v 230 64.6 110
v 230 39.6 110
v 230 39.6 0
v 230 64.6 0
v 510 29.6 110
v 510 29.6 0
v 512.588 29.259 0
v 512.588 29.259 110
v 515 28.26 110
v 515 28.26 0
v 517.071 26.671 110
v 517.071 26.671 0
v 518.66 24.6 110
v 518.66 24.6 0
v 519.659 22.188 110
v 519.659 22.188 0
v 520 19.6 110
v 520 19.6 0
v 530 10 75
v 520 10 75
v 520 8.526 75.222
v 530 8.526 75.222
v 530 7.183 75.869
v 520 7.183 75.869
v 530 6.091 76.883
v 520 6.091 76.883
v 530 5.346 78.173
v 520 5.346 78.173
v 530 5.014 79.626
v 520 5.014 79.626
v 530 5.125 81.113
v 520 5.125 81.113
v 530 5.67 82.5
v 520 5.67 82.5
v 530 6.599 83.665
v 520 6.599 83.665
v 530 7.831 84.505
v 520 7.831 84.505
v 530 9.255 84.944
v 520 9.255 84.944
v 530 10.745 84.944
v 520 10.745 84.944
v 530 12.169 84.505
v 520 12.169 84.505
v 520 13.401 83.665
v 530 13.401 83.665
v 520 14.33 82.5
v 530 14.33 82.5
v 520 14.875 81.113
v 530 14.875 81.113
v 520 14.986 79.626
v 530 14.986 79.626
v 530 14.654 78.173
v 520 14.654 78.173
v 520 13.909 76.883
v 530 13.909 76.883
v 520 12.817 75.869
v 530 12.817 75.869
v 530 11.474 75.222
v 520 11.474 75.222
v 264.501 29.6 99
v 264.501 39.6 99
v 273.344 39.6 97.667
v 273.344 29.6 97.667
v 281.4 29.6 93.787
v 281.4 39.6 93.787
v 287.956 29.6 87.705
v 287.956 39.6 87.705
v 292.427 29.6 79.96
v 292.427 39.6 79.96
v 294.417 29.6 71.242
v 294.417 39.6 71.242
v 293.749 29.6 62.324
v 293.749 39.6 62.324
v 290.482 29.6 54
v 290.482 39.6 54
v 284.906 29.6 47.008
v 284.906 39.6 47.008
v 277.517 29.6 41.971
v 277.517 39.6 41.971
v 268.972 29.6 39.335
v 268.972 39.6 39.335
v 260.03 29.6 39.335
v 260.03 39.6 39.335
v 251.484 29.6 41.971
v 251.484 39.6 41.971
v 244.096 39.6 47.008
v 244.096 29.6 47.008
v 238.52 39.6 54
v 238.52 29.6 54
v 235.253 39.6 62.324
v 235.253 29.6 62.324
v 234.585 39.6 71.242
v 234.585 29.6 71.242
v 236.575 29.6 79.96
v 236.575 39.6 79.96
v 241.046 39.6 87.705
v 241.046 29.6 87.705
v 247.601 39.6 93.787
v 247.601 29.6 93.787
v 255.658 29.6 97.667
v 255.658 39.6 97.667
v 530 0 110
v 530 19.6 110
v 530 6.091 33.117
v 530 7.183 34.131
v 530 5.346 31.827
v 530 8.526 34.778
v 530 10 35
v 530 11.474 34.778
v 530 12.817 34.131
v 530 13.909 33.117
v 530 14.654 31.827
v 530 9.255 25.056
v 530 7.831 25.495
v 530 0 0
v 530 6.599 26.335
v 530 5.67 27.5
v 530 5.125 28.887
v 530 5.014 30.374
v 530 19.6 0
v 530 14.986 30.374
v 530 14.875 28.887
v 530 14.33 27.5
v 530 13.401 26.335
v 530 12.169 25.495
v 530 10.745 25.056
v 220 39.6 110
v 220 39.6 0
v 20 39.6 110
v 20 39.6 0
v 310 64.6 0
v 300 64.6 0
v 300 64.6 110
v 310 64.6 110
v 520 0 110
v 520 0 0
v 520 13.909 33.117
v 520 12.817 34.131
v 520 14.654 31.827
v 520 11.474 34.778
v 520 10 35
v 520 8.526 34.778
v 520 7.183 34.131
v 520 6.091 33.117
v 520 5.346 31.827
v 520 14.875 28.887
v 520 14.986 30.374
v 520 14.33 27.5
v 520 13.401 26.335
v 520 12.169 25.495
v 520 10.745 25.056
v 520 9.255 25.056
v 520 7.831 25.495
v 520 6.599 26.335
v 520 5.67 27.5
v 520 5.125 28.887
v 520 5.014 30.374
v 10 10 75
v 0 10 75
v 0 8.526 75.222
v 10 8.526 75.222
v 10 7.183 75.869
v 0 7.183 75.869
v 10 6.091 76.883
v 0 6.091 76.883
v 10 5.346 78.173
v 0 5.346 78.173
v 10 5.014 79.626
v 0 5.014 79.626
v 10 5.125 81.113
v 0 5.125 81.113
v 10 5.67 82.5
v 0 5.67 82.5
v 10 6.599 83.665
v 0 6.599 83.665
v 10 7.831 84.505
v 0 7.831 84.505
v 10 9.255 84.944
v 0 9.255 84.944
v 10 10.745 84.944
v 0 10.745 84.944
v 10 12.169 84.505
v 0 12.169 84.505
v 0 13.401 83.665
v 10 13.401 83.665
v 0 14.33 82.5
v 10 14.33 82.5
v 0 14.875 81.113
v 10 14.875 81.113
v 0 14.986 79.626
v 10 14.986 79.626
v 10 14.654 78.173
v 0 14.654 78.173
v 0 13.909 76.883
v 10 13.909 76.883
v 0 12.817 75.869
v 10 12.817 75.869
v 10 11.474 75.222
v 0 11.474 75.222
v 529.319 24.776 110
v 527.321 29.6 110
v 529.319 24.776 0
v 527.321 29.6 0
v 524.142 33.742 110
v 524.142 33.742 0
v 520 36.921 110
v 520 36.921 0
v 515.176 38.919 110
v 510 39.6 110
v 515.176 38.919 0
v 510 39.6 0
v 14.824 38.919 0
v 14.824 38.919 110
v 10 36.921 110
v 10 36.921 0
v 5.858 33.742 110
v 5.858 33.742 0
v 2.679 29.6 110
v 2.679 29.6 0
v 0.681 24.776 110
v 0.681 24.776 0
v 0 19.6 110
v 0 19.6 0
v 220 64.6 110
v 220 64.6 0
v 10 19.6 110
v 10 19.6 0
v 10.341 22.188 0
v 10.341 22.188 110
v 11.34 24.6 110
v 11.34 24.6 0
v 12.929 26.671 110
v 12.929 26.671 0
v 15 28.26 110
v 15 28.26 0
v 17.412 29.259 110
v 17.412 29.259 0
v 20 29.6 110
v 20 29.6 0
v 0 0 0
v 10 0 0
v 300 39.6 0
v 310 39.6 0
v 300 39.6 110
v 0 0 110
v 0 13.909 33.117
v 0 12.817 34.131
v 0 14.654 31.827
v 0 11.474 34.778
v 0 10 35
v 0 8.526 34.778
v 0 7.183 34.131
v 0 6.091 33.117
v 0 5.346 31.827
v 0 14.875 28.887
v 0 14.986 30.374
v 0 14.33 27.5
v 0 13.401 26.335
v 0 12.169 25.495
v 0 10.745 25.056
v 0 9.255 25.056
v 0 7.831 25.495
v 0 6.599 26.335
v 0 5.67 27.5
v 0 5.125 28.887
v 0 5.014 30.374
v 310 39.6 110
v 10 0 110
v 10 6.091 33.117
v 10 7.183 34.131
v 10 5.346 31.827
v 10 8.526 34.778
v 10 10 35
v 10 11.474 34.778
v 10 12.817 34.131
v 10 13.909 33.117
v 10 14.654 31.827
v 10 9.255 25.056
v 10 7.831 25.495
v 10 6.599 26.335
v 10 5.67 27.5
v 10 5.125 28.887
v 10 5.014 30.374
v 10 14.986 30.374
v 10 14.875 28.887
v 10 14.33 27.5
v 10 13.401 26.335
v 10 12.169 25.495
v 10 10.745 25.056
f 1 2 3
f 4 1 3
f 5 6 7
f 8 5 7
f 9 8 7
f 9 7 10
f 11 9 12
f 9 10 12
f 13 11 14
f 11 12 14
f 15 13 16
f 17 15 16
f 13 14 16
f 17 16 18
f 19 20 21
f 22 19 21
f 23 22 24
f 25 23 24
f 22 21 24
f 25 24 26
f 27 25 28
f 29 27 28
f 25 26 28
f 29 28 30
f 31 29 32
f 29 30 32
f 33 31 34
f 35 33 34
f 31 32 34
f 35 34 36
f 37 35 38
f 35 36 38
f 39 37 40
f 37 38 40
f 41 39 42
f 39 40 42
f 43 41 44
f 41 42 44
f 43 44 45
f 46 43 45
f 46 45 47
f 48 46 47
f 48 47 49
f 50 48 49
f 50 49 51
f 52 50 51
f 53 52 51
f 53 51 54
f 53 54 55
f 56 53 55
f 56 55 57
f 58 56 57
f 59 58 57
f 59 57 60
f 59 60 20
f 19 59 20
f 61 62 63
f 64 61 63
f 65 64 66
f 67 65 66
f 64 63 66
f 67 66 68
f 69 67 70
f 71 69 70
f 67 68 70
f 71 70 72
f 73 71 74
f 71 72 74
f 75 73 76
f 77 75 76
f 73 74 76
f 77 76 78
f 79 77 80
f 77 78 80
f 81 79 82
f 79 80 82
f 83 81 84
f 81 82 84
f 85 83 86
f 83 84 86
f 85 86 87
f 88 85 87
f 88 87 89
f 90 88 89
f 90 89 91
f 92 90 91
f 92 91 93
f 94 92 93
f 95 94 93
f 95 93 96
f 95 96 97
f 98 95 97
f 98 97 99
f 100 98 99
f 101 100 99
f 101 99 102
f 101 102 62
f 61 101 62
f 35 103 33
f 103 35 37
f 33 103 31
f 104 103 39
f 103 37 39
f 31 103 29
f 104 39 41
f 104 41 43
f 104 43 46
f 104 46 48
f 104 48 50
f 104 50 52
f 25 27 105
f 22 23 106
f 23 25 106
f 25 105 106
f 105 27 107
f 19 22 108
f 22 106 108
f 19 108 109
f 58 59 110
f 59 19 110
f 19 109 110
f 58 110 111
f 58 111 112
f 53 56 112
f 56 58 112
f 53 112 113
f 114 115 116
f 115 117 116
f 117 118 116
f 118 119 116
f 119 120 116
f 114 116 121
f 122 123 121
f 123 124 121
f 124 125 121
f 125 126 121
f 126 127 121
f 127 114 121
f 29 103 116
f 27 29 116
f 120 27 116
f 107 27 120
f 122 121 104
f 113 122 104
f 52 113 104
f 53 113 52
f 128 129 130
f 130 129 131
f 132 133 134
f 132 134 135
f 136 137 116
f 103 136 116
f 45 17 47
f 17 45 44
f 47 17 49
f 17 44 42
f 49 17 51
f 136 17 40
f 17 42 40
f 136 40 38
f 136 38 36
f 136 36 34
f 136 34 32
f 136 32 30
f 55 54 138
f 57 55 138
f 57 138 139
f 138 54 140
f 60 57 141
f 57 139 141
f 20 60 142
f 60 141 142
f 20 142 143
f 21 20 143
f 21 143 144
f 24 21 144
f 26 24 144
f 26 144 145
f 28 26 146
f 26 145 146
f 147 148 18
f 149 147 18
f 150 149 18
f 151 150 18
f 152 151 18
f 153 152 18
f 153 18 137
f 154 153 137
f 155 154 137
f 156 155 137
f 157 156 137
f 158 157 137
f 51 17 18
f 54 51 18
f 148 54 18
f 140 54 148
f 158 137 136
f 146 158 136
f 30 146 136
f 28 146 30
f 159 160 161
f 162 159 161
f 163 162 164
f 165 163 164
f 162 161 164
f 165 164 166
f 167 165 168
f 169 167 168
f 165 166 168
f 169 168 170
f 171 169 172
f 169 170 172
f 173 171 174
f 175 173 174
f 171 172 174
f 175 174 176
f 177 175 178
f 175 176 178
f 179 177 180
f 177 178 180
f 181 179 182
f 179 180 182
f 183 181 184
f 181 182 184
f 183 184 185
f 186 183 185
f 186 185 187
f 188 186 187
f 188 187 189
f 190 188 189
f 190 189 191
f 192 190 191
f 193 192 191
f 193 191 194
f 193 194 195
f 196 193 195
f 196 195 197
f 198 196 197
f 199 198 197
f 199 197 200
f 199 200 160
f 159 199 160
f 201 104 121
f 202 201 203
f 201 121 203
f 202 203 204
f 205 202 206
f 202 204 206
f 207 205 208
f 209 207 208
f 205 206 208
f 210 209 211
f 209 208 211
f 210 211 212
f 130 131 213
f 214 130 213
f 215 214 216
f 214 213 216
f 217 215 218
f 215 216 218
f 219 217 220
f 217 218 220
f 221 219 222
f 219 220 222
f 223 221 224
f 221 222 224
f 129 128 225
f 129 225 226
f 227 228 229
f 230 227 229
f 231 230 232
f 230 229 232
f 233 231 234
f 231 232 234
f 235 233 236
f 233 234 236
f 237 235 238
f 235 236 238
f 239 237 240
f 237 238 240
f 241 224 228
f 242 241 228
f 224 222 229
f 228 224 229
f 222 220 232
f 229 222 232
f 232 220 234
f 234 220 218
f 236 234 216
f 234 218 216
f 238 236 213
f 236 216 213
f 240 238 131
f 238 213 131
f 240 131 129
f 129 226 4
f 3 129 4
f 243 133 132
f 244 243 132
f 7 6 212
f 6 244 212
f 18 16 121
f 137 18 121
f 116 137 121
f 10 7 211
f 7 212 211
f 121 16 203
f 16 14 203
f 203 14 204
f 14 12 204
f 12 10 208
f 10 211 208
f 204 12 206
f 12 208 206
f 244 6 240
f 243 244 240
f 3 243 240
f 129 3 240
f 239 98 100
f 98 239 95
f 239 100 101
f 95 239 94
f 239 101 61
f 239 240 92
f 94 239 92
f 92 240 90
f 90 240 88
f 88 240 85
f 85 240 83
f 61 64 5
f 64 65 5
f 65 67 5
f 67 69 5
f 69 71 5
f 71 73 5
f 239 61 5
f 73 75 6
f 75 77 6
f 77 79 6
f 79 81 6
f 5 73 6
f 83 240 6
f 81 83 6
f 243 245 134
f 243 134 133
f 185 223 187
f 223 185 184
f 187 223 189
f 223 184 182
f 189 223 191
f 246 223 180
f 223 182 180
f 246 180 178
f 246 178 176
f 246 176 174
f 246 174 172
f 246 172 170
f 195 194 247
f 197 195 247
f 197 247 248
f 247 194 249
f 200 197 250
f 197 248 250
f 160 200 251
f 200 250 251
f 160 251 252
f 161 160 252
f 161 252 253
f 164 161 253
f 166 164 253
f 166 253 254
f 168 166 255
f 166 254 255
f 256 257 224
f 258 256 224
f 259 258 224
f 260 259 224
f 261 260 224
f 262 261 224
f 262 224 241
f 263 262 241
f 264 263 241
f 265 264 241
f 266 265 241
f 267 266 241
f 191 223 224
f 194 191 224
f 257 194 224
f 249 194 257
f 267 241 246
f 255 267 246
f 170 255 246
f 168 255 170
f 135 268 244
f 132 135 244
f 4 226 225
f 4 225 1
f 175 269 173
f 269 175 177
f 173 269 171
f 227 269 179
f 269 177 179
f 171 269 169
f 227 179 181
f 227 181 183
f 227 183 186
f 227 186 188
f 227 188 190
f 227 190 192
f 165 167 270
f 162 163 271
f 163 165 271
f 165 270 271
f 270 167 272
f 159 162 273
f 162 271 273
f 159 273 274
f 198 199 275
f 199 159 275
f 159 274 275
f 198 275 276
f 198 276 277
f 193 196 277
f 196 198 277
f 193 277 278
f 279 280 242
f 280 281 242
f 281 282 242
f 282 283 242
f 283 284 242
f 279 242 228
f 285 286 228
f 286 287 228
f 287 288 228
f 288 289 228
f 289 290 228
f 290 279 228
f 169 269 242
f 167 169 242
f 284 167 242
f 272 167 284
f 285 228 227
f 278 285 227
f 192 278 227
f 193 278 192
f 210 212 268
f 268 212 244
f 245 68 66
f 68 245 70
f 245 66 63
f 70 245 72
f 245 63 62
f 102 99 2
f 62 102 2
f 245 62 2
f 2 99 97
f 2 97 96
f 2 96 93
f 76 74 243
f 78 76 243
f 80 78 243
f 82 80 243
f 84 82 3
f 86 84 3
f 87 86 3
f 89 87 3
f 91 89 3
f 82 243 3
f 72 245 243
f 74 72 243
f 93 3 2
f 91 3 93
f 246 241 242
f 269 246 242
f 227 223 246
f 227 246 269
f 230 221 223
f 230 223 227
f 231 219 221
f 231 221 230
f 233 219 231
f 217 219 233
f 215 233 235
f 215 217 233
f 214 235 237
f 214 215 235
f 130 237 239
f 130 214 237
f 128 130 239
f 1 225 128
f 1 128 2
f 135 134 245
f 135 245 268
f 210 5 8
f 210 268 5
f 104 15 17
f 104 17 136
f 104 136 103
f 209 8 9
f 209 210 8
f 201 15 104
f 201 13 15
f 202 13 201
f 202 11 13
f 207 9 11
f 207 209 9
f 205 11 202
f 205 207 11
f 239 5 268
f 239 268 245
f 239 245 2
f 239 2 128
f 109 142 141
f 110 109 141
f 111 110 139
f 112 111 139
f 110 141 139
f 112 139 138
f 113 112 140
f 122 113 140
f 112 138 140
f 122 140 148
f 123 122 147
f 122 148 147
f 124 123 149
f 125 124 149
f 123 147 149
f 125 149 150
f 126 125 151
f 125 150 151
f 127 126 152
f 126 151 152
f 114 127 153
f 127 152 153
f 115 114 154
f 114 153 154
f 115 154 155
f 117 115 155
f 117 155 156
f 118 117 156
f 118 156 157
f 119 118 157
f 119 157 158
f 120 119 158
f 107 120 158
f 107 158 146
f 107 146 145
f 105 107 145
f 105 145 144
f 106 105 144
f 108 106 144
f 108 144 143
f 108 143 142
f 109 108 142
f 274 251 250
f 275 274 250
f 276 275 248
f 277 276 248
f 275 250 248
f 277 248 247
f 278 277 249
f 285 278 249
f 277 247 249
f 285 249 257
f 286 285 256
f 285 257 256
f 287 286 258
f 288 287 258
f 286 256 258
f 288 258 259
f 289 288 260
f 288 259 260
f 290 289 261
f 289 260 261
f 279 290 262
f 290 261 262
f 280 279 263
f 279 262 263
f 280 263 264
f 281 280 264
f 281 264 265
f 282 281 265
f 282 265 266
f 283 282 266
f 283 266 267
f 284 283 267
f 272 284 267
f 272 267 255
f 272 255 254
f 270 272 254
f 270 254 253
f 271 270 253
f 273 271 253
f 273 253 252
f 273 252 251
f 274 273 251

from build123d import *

# Parameters (mm, degrees)
BOSS_EXTRUDE2_DEPTH = 110
SKETCH2_R           = 5
CUT_EXTRUDE1_DEPTH  = 543.741338024
SKETCH3_W           = 10
SKETCH3_H           = 110
BOSS_EXTRUDE3_DEPTH = 25
SKETCH5_R           = 30
CUT_EXTRUDE2_DEPTH  = 543.741338024


with BuildPart() as part:
    # Sketch1 → Boss-Extrude2 (new body)
    with BuildSketch(Plane.XY):
        with BuildLine():
            Line((20, 29.6), (510, 29.6))
            ThreePointArc((510, 29.6), (517.071067812, 26.671067812), (520, 19.6))
            Line((520, 19.6), (520, 0))
            Line((520, 0), (530, 0))
            Line((530, 0), (530, 19.6))
            ThreePointArc((530, 19.6), (524.142135624, 33.742135624), (510, 39.6))
            Line((510, 39.6), (20, 39.6))
            ThreePointArc((20, 39.6), (5.857864376, 33.742135624), (0, 19.6))
            Line((0, 19.6), (0, 0))
            Line((0, 0), (10, 0))
            Line((10, 0), (10, 19.6))
            ThreePointArc((10, 19.6), (12.928932188, 26.671067812), (20, 29.6))
        make_face()
    extrude(amount=BOSS_EXTRUDE2_DEPTH)

    # Sketch2 → Cut-Extrude1 (cut, through all)
    with BuildSketch(Plane.ZY):
        with Locations((30, 10)):
            Circle(SKETCH2_R)
        with Locations(Location((80, 10, 0), (0, 0, 180))):
            Circle(SKETCH2_R)
    extrude(amount=-CUT_EXTRUDE1_DEPTH, mode=Mode.SUBTRACT)

    # Sketch3 → Boss-Extrude3 (add)
    with BuildSketch(Plane(origin=(0, 39.6, 0), x_dir=(1, 0, 0), z_dir=(0, 1, 0))):
        with Locations((225, -55)):
            Rectangle(SKETCH3_W, SKETCH3_H)
        with Locations((305, -55)):
            Rectangle(SKETCH3_W, SKETCH3_H)
    extrude(amount=BOSS_EXTRUDE3_DEPTH)

    # Sketch5 → Cut-Extrude2 (cut, through all)
    with BuildSketch(Plane(origin=(0, 39.6, 0), x_dir=(1, 0, 0), z_dir=(0, 1, 0))):
        with Locations(Location((264.500885843, -69, 0), (0, 0, 270))):
            Circle(SKETCH5_R)
    extrude(amount=-CUT_EXTRUDE2_DEPTH, mode=Mode.SUBTRACT)


solid = part.part
